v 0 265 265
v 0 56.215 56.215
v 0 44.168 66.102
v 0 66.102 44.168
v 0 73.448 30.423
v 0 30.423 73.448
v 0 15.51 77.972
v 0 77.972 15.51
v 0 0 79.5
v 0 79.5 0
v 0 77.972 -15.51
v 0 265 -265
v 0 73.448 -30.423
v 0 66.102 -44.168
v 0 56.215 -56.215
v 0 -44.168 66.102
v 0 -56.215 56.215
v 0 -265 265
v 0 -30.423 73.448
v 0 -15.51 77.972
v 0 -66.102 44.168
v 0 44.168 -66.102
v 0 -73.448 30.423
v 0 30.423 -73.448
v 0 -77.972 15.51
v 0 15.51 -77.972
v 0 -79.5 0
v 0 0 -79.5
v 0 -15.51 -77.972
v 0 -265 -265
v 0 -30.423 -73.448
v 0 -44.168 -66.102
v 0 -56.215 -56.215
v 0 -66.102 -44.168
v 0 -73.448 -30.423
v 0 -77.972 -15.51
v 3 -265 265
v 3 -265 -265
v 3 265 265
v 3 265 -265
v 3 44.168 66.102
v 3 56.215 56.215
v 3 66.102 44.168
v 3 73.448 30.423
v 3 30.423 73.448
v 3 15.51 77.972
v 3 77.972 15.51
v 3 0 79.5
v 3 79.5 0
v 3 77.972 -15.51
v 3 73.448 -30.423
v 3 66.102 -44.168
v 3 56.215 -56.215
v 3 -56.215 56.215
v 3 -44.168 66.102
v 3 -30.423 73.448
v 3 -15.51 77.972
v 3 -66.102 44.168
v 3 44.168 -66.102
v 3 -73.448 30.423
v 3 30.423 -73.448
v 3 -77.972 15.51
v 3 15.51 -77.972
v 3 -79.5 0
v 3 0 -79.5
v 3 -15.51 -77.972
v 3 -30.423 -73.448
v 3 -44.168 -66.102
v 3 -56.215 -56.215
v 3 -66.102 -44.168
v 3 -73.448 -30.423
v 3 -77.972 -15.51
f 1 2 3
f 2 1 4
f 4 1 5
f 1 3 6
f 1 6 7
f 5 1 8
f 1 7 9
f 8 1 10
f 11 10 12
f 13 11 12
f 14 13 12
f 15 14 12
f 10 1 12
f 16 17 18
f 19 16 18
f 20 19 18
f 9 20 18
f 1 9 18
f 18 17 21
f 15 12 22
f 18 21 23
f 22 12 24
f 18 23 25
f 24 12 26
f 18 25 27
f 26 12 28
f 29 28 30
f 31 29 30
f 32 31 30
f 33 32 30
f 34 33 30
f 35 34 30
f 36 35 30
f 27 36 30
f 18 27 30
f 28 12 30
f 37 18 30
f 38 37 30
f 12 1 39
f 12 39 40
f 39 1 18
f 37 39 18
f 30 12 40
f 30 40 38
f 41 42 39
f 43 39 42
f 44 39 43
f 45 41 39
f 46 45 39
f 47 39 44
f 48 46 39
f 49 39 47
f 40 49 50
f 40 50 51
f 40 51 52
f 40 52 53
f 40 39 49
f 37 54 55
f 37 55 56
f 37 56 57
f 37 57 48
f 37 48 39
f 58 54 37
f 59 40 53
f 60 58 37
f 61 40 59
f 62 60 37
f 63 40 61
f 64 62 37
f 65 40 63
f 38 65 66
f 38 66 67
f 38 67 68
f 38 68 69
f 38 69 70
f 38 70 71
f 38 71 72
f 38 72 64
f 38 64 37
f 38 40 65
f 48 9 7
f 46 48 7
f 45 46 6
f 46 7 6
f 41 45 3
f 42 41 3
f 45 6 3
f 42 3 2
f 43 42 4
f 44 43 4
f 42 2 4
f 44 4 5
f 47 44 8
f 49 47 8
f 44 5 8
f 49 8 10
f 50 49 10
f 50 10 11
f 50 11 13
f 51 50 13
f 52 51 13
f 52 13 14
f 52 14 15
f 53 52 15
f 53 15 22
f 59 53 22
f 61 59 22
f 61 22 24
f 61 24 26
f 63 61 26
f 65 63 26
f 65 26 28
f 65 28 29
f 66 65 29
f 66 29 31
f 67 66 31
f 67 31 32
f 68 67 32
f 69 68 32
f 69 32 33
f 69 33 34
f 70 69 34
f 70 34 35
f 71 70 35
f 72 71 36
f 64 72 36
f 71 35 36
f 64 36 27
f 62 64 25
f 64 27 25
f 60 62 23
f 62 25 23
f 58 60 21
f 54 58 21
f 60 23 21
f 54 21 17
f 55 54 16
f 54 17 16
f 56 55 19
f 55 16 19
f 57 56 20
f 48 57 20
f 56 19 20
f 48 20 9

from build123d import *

# Parameters (mm, degrees)
CROQUIS1_W     = 530
CROQUIS1_H     = 530
EXTRUIR1_DEPTH = 3
CROQUIS3_R     = 79.5
EXTRUIR2_DEPTH = 375.77860131


with BuildPart() as part:
    # Croquis1 → Extruir1 (new body)
    with BuildSketch(Plane(origin=(0, 0, 0), x_dir=(0, -1, 0), z_dir=(1, 0, 0))):
        Rectangle(CROQUIS1_W, CROQUIS1_H)
    extrude(amount=EXTRUIR1_DEPTH)

    # Croquis3 → Extruir2 (cut, through all)
    with BuildSketch(Plane.ZY):
        Circle(CROQUIS3_R)
    extrude(amount=-EXTRUIR2_DEPTH, mode=Mode.SUBTRACT)


solid = part.part
